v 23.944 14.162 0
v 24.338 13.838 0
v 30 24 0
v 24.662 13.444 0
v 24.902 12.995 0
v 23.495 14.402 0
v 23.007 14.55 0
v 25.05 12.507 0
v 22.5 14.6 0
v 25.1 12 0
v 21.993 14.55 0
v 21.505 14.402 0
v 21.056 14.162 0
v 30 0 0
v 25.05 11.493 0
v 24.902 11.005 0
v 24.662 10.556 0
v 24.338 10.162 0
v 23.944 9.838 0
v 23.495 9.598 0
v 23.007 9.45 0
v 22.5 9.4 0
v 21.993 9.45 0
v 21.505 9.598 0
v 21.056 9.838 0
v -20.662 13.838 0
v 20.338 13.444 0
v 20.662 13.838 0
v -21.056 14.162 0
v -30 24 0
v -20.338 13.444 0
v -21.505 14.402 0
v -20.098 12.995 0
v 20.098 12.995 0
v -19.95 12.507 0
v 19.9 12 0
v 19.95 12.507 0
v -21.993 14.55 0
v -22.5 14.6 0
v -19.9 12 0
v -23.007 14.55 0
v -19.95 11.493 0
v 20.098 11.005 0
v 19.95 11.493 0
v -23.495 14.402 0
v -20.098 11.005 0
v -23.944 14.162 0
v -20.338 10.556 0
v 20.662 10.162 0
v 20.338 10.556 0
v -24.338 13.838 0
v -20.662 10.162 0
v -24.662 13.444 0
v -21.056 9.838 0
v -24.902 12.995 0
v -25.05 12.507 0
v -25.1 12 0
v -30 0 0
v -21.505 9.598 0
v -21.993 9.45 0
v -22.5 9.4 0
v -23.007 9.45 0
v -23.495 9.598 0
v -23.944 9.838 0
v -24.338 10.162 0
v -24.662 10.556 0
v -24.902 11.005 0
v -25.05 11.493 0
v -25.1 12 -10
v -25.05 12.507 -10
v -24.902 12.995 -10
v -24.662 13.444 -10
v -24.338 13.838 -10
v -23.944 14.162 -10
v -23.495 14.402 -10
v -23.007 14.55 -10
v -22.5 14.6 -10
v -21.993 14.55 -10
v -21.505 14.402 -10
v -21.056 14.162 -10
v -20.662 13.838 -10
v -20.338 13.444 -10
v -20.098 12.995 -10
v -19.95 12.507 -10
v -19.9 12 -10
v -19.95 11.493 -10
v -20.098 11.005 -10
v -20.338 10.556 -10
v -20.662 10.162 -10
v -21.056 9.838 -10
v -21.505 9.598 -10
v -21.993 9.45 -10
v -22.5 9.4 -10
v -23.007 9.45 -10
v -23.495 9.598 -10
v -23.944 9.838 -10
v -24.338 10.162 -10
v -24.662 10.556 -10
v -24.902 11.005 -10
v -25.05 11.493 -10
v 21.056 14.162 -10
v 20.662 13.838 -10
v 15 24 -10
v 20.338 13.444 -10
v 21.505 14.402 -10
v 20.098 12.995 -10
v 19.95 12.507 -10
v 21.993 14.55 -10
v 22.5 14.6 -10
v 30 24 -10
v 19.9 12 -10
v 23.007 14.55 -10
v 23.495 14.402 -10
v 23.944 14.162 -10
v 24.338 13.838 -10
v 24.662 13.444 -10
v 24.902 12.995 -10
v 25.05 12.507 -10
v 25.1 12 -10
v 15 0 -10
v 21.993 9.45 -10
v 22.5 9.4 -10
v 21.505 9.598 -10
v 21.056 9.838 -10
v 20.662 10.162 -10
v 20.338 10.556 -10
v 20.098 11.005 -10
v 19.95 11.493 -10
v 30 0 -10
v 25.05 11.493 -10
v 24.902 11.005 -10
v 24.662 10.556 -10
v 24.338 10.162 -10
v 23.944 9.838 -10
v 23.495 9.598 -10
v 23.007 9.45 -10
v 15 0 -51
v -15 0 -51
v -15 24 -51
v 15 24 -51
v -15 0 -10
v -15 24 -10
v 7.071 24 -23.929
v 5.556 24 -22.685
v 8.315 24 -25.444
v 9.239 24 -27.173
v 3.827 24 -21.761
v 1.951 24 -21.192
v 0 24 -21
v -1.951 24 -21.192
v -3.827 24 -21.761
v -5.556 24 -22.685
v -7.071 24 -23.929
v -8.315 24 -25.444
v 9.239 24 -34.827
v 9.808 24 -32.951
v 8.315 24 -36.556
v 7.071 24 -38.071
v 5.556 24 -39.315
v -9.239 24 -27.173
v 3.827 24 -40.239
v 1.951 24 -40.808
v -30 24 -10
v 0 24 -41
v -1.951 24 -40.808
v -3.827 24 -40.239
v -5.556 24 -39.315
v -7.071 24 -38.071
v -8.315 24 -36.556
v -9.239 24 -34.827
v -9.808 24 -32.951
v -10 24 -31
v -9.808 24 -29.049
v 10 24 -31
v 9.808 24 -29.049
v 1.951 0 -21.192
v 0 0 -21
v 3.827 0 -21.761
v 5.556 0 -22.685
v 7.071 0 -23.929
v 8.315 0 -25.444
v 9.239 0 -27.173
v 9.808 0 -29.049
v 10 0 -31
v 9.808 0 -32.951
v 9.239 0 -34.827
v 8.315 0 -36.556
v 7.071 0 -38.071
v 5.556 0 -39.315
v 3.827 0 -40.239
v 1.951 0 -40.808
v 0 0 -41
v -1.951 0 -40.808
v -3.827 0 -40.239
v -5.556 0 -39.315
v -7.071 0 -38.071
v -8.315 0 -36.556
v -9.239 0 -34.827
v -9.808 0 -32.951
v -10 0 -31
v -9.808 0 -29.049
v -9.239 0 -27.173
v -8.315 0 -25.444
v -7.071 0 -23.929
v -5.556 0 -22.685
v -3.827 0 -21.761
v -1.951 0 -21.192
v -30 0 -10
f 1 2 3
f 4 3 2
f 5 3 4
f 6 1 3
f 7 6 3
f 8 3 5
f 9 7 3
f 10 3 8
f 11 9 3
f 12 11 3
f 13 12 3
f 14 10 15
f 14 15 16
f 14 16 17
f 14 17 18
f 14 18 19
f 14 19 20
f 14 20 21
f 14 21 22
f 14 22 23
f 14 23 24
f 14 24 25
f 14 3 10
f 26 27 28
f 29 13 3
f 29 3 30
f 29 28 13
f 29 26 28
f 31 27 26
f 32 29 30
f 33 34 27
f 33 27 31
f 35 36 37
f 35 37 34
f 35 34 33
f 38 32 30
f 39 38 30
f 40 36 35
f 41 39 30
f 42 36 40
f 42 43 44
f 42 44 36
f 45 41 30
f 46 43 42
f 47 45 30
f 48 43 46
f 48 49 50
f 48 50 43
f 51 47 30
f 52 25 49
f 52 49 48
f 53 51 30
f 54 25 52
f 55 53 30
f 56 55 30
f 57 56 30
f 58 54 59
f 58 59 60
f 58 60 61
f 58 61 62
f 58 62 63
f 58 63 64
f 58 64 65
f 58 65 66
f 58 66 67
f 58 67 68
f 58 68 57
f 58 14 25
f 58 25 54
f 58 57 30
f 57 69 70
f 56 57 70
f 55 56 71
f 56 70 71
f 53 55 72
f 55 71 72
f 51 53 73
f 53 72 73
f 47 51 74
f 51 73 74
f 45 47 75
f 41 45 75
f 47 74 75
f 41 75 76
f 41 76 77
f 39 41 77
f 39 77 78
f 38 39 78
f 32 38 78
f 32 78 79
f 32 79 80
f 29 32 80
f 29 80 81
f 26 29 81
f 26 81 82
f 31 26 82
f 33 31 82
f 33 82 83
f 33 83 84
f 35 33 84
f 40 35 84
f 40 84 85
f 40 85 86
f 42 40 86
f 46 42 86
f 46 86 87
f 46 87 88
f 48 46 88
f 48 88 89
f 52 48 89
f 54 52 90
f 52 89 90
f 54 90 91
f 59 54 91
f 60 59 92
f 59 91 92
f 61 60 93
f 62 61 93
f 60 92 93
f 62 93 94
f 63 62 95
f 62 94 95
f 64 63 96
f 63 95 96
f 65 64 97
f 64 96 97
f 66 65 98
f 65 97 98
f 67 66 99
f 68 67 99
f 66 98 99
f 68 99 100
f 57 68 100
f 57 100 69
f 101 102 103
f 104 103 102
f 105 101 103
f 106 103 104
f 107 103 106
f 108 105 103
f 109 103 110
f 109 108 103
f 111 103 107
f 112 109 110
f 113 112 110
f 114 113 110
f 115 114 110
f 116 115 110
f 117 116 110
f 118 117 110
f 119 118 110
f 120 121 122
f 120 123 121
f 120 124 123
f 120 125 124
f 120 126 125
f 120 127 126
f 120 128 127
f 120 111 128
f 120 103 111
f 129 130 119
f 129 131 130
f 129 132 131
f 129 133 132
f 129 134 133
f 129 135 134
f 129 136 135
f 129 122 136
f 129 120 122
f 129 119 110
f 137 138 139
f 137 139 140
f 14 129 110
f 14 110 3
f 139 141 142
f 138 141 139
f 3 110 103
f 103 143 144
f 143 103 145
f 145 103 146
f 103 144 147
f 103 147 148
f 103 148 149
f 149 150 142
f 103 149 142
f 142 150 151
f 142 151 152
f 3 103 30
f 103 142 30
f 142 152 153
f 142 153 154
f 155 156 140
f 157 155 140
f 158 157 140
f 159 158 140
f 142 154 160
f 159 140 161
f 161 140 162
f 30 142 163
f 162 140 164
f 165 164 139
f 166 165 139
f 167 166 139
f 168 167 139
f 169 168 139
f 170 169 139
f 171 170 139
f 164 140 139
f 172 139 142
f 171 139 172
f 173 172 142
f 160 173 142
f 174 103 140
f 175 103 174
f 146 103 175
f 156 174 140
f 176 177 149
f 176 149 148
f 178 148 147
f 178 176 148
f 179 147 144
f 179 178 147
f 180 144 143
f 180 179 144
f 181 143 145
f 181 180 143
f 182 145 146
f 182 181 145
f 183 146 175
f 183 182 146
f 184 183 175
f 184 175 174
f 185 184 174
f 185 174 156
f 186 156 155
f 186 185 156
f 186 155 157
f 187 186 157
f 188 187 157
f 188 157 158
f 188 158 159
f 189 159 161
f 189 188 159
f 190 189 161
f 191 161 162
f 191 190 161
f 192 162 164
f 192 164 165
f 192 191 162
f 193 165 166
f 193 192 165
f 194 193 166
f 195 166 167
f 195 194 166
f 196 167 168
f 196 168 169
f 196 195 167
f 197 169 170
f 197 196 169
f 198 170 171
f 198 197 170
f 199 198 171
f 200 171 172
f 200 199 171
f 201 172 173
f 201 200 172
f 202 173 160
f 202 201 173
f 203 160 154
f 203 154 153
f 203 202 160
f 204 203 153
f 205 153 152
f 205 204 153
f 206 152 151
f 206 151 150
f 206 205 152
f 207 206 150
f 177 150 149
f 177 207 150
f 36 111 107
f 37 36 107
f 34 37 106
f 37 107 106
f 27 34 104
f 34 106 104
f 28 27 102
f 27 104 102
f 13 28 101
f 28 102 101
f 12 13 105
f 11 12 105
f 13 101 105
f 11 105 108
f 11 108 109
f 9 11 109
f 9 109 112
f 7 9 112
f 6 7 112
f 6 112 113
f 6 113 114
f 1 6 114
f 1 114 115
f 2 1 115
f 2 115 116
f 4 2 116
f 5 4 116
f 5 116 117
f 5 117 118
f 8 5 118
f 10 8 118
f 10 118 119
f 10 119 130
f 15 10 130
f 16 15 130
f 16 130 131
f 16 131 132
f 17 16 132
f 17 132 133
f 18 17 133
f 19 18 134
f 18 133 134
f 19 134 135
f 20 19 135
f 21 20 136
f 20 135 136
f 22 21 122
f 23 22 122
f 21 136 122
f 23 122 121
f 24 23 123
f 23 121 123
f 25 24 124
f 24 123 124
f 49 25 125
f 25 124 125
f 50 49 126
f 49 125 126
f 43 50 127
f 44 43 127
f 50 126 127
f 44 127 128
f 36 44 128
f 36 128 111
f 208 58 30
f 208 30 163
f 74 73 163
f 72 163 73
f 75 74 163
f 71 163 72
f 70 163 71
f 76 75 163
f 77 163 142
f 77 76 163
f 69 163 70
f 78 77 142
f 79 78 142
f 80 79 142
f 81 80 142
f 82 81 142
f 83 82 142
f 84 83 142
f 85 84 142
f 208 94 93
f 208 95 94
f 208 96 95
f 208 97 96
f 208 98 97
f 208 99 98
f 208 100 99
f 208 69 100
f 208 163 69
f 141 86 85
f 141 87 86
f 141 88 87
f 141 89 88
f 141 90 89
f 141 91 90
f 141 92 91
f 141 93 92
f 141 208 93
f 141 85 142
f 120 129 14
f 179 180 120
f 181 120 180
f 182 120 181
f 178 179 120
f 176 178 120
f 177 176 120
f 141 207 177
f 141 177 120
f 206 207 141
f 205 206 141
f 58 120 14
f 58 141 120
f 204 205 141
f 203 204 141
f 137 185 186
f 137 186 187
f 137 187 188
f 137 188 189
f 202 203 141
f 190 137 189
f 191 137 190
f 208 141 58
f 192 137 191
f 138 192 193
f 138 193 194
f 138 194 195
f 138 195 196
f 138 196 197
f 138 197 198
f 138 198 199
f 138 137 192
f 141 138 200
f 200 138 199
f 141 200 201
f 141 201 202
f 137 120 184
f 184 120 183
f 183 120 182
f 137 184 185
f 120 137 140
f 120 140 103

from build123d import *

# Parameters (mm, degrees)
SKETCH_1_R          = 10
EXTRUDE_1_DEPTH     = 24
SKETCH_2_R          = 2.6
CUT_EXTRUDE_1_DEPTH = 24


with BuildPart() as part:
    # 草图1 → 凸台-拉伸1 (new body)
    with BuildSketch(Plane(origin=(0, 0, 0), x_dir=(1, 0, 0), z_dir=(0, 1, 0))):
        Polygon((30, 0), (-30, 0), (-30, 10), (-15, 10), (-15, 51), (15, 51), (15, 10), (30, 10), align=None)
        with Locations(Location((0, 31, 0), (0, 0, 270))):
            Circle(SKETCH_1_R, mode=Mode.SUBTRACT)
    extrude(amount=EXTRUDE_1_DEPTH)

    # 草图2 → 切除-拉伸1 (cut)
    with BuildSketch(Plane(origin=(0, 0, -10), x_dir=(-1, 0, 0), z_dir=(0, 0, -1))):
        with Locations((-22.5, 12)):
            Circle(SKETCH_2_R)
        with Locations((22.5, 12)):
            Circle(SKETCH_2_R)
    extrude(amount=-CUT_EXTRUDE_1_DEPTH, mode=Mode.SUBTRACT)


solid = part.part
